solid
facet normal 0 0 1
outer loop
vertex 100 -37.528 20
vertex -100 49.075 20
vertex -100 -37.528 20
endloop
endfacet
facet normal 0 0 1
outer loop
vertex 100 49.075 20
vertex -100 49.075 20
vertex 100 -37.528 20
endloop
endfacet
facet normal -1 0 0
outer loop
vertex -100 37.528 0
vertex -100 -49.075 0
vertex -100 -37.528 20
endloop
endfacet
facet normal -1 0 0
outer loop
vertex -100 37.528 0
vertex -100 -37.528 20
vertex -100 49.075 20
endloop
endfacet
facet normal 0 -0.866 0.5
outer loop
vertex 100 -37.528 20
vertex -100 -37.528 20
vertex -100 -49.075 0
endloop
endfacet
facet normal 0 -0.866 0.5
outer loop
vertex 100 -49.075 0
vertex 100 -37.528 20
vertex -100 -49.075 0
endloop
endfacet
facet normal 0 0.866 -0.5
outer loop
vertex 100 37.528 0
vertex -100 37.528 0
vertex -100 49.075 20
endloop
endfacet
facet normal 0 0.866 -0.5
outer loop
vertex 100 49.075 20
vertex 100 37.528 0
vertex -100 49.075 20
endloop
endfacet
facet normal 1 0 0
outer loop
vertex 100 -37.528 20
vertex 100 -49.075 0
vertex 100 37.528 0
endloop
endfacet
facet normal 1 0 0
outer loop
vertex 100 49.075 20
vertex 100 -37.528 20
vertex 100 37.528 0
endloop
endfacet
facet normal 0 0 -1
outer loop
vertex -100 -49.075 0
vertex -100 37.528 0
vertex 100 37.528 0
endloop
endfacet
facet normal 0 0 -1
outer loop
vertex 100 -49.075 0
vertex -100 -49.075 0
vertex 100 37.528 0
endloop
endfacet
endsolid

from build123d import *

# Parameters (mm, degrees)
F0_W     = 200
F0_H     = 98.15
F1_DEPTH = 20
F3_DEPTH = 200.001
F4_DEPTH = 200.001


with BuildPart() as f1:
    # F0 (on Top) → F1 (new body)
    with BuildSketch(Plane.XY):
        Rectangle(F0_W, F0_H)
    extrude(amount=F1_DEPTH)

    # F2 (on face) → F3 (cut, through all)
    with BuildSketch(Plane(origin=(-100, 0, 0), x_dir=(0, -1, 0), z_dir=(-1, 0, 0))):
        Polygon((-37.527995, 0), (-49.075, 20), (-49.075, 0), align=None)
        Polygon((37.527995, 20), (49.075, 0), (49.075, 20), align=None)
    extrude(amount=-F3_DEPTH, mode=Mode.SUBTRACT)

    # F2 (on face) → F4 (cut, through all)
    with BuildSketch(Plane(origin=(-100, 0, 0), x_dir=(0, -1, 0), z_dir=(-1, 0, 0))):
        Polygon((-37.527995, 0), (-49.075, 20), (-49.075, 0), align=None)
        Polygon((37.527995, 20), (49.075, 0), (49.075, 20), align=None)
    extrude(amount=-F4_DEPTH, mode=Mode.SUBTRACT)


solid = f1.part
